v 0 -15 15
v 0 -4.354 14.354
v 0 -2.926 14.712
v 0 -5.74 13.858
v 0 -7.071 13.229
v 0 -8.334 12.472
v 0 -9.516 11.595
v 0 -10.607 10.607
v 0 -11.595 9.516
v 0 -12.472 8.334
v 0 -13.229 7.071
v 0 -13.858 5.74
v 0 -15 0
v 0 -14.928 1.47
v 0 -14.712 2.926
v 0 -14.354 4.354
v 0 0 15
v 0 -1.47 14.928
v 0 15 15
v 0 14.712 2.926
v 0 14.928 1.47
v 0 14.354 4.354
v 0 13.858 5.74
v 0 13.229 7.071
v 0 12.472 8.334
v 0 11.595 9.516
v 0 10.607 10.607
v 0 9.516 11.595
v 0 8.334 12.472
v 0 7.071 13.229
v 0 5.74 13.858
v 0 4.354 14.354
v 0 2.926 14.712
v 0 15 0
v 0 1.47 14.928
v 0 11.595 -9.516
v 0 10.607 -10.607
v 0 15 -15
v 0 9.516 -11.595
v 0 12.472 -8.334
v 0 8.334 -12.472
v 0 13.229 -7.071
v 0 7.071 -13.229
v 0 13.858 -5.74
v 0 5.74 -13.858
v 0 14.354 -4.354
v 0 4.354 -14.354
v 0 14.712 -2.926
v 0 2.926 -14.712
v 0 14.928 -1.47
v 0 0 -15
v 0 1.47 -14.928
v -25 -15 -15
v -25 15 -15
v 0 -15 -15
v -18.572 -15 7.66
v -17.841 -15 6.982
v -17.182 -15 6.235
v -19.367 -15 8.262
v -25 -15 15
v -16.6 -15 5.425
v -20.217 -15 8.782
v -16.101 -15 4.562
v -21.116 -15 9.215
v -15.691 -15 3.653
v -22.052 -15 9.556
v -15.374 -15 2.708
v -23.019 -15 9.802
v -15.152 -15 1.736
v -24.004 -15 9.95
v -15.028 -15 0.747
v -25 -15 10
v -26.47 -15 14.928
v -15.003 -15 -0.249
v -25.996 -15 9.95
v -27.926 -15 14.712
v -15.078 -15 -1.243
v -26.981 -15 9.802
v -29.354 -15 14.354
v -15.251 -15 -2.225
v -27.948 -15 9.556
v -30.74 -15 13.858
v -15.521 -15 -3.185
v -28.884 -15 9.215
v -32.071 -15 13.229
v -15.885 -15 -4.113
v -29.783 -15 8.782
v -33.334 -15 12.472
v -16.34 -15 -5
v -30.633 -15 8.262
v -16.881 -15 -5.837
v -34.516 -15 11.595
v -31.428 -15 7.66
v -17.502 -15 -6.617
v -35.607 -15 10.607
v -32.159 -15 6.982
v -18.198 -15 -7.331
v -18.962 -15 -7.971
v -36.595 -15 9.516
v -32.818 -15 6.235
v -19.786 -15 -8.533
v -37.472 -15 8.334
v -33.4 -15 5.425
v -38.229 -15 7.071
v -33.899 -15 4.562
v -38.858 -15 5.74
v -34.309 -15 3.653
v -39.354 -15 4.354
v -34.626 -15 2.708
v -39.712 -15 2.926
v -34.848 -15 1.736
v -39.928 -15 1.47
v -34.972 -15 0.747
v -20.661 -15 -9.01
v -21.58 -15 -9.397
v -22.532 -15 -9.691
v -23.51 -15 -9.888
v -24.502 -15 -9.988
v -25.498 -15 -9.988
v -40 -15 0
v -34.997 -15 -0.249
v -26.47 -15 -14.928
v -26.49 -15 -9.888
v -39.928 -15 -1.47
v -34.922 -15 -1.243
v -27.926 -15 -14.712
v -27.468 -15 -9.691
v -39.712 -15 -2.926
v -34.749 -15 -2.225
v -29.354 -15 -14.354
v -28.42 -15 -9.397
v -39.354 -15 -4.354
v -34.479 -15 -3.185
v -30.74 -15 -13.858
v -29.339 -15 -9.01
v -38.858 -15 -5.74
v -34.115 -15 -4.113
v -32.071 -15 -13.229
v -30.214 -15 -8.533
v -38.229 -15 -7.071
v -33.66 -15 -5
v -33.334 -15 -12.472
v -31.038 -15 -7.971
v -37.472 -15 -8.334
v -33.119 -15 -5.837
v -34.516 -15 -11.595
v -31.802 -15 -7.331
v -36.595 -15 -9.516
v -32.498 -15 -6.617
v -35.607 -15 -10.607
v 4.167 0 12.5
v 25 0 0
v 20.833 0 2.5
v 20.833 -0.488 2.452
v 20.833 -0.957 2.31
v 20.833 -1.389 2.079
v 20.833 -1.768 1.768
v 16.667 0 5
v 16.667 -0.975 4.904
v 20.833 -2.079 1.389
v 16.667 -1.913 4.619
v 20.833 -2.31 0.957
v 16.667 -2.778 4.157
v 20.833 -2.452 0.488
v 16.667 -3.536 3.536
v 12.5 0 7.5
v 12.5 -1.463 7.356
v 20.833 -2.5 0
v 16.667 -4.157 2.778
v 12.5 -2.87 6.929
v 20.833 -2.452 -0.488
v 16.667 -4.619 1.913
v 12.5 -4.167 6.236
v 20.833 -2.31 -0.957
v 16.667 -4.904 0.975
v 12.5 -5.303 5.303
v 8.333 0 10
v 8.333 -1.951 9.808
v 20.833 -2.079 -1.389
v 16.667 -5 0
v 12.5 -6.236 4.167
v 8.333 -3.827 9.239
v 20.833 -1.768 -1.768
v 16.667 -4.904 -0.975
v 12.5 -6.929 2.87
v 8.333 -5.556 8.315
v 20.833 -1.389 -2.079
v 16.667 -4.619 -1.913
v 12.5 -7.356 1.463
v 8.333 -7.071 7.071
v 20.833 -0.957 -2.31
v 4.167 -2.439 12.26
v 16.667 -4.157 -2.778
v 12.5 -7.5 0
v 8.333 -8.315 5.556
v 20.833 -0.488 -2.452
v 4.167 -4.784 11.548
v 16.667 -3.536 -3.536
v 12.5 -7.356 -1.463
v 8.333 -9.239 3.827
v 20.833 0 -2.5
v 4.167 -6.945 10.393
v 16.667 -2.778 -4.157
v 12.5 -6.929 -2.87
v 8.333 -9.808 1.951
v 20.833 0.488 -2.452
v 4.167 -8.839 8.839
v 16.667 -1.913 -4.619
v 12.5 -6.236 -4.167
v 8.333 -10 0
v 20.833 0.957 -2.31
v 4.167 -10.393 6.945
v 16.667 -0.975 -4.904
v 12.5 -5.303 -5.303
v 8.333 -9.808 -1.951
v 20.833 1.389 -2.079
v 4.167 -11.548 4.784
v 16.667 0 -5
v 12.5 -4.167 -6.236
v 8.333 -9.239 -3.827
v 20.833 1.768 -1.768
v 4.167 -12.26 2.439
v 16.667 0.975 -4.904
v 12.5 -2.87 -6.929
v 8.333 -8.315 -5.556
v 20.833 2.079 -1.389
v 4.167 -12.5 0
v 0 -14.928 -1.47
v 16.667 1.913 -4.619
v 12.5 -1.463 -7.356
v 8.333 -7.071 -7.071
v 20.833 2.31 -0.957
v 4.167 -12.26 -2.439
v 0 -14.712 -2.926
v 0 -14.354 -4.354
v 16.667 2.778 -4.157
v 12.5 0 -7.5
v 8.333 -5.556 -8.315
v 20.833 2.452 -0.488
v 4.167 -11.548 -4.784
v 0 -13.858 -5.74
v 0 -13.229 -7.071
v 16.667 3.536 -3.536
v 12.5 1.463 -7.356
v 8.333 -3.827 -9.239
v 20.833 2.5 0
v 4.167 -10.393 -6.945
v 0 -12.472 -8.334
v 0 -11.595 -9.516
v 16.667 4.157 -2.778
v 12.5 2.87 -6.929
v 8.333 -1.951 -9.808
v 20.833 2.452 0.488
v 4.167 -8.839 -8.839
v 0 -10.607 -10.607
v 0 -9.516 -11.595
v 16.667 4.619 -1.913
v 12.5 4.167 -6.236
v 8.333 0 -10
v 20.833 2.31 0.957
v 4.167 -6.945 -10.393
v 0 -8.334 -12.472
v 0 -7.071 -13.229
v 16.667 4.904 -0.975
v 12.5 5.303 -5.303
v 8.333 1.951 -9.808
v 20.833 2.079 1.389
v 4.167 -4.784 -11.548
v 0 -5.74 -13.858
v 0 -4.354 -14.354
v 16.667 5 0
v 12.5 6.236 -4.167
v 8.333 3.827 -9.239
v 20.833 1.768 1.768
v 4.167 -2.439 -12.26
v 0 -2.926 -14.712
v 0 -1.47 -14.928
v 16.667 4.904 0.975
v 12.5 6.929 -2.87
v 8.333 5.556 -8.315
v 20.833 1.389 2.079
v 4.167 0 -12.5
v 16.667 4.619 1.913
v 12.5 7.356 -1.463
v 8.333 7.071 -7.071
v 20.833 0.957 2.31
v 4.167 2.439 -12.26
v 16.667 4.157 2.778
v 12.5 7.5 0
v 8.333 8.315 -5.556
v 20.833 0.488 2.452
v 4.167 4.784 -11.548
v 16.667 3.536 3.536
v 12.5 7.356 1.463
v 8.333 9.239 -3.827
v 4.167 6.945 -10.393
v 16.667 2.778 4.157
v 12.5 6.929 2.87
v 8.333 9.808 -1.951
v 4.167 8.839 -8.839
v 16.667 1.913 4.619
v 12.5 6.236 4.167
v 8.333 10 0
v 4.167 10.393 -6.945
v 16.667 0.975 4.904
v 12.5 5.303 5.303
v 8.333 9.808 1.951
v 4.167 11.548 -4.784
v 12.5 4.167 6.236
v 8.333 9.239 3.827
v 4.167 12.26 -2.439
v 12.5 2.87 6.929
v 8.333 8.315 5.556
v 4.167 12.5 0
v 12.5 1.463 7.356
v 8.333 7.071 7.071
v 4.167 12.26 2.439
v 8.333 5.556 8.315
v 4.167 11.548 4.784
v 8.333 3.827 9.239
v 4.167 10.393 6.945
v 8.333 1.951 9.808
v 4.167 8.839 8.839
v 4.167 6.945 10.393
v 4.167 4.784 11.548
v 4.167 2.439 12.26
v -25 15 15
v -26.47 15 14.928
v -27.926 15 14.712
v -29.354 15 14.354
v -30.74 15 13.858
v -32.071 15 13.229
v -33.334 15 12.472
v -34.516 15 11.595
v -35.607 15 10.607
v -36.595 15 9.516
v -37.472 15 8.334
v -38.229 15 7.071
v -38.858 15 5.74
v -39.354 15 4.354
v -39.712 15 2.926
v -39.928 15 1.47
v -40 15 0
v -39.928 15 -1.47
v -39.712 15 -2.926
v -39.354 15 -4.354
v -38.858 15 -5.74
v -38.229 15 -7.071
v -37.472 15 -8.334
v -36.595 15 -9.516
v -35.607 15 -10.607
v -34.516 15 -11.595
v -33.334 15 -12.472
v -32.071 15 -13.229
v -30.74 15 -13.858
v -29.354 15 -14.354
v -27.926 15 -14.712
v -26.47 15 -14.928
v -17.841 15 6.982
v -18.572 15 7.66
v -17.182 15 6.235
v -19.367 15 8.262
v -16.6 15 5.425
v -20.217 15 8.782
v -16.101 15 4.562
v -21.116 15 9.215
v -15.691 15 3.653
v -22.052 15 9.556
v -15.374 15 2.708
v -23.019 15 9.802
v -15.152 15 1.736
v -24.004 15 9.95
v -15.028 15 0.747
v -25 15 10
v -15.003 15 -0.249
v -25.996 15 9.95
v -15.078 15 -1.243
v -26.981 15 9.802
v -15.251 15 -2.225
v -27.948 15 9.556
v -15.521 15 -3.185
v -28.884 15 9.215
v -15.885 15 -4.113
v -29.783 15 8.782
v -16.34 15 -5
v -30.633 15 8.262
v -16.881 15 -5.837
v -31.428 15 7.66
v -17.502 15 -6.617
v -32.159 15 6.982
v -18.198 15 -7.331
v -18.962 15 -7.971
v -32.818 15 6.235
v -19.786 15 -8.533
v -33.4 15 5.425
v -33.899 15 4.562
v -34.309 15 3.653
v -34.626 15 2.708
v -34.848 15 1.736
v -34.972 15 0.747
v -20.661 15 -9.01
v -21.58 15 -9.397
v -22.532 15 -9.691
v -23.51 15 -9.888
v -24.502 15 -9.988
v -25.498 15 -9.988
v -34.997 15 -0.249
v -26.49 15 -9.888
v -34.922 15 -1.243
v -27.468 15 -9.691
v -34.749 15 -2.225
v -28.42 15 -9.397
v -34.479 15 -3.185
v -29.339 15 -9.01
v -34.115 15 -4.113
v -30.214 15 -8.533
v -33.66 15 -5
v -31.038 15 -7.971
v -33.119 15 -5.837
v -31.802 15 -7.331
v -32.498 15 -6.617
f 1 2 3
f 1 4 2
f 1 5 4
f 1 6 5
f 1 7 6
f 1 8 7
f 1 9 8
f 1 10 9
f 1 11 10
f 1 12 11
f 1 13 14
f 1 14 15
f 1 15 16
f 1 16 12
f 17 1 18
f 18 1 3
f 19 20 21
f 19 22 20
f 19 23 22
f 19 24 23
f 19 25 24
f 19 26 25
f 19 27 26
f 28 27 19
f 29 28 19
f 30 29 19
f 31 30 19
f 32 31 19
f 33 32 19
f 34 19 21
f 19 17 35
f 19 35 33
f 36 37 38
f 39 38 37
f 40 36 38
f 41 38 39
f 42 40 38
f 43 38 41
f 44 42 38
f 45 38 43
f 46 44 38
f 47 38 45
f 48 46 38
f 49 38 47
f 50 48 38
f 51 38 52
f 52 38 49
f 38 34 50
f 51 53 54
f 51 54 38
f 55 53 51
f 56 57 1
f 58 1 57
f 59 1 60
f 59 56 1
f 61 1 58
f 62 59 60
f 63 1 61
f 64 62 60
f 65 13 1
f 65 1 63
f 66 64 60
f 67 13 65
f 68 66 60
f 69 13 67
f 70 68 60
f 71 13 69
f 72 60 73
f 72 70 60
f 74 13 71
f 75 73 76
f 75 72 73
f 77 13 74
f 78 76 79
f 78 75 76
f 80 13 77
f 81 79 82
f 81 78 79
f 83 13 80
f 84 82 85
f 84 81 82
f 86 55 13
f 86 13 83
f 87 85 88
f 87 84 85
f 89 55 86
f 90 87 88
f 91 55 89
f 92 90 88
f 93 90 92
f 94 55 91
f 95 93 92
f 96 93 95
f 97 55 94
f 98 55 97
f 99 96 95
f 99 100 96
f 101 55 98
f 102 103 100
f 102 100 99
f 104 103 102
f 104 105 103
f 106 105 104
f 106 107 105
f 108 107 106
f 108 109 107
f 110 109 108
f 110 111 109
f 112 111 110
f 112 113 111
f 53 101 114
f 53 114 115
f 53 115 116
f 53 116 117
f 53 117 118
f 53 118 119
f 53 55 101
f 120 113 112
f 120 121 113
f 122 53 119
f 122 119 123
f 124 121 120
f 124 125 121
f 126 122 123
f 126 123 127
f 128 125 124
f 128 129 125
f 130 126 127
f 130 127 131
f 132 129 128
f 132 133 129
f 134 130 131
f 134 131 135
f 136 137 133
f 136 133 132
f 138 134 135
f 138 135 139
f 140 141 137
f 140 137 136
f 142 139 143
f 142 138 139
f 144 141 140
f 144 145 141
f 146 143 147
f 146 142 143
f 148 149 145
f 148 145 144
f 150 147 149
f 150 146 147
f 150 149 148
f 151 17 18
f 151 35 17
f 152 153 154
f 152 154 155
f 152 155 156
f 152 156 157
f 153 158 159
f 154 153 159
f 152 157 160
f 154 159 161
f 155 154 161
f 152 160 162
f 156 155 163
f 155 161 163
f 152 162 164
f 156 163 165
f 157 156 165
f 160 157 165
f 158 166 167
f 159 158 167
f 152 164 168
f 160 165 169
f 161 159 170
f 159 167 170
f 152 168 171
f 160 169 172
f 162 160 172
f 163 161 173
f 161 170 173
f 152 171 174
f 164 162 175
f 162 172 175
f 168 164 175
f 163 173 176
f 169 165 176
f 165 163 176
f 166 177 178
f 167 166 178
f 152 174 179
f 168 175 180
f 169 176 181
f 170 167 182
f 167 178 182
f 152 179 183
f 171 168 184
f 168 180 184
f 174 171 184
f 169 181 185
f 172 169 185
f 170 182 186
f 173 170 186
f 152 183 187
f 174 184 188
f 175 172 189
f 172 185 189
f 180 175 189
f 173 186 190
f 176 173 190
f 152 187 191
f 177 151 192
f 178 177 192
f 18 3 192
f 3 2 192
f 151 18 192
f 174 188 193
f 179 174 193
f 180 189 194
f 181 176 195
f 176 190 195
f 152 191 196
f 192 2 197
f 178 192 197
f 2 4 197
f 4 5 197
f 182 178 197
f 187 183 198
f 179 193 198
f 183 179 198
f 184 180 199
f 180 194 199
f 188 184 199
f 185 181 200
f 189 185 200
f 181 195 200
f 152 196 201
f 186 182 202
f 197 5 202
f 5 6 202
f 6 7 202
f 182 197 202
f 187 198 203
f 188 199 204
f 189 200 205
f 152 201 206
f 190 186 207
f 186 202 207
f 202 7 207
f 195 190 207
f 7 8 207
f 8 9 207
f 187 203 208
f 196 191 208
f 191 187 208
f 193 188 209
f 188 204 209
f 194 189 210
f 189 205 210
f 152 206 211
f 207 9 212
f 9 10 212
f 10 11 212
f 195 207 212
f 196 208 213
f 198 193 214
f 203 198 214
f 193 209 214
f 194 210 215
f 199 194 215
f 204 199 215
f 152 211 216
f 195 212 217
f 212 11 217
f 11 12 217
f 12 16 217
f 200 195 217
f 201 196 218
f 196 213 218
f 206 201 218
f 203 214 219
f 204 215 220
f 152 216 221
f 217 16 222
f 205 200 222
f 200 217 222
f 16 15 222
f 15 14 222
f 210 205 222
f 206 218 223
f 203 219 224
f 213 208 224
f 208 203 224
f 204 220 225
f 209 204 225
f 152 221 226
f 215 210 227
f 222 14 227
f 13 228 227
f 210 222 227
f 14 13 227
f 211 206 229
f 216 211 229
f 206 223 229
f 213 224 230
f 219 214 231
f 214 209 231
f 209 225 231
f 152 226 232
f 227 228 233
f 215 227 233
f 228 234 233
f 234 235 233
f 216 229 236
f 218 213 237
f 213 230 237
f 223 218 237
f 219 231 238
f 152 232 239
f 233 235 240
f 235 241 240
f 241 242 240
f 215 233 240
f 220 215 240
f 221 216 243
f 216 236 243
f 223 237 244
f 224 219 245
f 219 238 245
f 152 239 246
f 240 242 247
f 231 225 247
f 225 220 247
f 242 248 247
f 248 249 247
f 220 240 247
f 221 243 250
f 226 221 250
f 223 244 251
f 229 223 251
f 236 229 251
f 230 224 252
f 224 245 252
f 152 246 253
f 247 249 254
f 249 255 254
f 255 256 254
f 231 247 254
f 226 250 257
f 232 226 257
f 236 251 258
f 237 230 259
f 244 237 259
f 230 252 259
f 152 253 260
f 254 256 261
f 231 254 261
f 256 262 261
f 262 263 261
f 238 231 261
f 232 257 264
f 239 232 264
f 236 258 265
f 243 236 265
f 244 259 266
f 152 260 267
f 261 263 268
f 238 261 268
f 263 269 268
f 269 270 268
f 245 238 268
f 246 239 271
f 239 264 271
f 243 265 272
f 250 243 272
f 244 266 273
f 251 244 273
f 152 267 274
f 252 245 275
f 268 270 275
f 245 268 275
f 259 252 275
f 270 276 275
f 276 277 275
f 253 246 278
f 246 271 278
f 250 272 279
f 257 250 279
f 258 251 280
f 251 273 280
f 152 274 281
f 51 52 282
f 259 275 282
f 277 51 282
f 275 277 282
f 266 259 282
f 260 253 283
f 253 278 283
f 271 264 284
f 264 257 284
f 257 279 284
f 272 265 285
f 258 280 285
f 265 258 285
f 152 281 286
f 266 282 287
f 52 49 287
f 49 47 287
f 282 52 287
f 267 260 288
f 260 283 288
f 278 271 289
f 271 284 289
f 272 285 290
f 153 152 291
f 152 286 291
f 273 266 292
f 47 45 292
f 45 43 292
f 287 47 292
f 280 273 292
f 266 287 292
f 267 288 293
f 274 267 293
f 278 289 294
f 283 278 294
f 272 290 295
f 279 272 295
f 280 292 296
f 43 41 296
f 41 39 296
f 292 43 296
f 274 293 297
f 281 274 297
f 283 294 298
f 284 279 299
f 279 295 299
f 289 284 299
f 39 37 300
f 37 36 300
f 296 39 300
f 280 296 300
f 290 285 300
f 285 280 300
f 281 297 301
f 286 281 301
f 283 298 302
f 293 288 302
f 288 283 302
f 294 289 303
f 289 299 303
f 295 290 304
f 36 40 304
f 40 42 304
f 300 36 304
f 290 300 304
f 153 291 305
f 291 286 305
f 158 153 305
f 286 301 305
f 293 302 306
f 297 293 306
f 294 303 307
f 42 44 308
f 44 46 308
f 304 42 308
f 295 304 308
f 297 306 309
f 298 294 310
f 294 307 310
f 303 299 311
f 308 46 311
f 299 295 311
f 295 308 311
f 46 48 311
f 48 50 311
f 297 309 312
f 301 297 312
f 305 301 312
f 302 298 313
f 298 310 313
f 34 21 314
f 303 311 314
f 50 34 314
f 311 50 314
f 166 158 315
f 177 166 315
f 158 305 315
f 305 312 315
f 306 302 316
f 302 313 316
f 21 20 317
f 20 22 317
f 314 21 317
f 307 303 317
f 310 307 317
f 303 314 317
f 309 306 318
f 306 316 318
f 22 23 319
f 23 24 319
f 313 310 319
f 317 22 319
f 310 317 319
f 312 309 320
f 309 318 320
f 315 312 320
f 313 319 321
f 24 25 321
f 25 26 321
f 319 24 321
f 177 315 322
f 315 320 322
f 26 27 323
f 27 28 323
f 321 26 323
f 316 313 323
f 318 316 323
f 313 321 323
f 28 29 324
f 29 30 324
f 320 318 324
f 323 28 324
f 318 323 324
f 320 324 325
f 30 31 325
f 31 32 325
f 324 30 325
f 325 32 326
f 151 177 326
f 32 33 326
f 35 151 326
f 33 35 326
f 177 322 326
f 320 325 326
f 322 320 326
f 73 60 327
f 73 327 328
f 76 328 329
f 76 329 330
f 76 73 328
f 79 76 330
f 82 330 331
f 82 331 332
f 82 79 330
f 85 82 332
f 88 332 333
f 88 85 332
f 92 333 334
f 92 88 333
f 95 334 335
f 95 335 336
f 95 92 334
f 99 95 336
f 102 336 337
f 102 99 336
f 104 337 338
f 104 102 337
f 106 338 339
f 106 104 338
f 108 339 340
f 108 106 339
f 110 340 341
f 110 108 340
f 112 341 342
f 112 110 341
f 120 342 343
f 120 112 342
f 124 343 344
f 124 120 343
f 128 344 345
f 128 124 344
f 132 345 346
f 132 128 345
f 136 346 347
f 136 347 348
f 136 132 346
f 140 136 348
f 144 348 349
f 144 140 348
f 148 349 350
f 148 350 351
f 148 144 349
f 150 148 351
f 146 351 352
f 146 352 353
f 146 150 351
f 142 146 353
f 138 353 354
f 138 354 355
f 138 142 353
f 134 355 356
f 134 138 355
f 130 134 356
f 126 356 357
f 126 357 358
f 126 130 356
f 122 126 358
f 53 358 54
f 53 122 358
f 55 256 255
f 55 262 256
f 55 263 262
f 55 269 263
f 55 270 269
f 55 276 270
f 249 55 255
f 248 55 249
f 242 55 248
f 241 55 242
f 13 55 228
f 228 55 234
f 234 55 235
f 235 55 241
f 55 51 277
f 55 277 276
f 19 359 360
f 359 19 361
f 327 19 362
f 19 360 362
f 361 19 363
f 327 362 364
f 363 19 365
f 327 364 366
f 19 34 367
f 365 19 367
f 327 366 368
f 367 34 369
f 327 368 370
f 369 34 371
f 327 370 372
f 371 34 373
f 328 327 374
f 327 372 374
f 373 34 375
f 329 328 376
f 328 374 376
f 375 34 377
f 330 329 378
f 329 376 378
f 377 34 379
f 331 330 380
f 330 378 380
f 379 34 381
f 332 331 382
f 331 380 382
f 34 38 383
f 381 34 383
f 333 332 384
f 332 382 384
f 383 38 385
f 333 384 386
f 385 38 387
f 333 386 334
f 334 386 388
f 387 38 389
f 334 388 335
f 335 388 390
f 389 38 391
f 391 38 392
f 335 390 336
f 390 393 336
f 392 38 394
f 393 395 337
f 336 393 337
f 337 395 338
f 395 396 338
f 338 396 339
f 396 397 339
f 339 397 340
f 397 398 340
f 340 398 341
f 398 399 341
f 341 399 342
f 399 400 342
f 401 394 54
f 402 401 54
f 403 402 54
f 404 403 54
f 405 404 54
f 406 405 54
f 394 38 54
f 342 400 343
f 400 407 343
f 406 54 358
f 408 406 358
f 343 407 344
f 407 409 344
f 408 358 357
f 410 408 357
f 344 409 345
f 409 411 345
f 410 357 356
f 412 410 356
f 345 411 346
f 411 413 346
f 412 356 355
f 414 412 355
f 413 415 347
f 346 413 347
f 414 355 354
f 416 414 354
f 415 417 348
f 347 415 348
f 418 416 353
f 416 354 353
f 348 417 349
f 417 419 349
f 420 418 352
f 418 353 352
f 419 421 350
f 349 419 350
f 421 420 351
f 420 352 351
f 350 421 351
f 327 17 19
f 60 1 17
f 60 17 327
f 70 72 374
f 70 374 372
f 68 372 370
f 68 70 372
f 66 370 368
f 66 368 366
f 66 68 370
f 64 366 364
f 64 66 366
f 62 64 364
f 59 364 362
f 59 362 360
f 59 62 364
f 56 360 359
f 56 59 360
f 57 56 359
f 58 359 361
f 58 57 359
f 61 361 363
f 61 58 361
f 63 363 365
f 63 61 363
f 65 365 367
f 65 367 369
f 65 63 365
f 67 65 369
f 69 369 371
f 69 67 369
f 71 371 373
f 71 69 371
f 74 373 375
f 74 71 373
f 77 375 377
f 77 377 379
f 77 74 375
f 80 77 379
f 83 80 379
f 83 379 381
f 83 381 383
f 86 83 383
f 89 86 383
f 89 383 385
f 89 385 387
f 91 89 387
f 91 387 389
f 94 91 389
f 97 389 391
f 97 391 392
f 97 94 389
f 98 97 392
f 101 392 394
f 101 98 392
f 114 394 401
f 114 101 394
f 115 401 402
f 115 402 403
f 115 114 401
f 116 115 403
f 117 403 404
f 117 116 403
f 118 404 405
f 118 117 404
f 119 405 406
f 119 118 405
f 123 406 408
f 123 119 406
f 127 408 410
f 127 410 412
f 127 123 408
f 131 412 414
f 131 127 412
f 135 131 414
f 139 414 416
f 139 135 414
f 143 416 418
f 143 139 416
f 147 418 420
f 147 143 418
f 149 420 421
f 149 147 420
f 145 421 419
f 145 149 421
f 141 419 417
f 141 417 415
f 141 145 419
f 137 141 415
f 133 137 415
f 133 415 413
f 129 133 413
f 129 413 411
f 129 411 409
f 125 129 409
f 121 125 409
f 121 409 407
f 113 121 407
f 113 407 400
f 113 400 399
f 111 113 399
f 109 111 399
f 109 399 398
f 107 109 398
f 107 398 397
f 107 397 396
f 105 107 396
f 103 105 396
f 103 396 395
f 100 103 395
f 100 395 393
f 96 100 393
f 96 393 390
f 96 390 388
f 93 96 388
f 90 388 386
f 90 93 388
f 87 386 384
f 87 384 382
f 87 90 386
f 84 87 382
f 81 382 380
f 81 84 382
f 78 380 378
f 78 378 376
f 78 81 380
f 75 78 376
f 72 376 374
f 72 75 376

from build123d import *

# Parameters (mm, degrees)
BOSS_EXTRUDE2_DEPTH      = 15
BOSS_EXTRUDE2_DEPTH_BACK = 15
SKETCH1_R                = 10


with BuildPart() as part:
    # Sketch1 → Boss-Extrude2 (new, two sides: drawn at the far end of the back side and taken through both)
    with BuildSketch(Plane(origin=(0, 0, 0), x_dir=(1, 0, 0), z_dir=(0, 1, 0)).offset(-BOSS_EXTRUDE2_DEPTH_BACK)):
        with BuildLine():
            Line((0, 15), (-25, 15))
            ThreePointArc((-25, 15), (-40, 0), (-25, -15))
            Line((-25, -15), (0, -15))
            Line((0, -15), (0, 0))
            Line((0, 0), (0, 15))
        make_face()
        with Locations((-25, 0)):
            Circle(SKETCH1_R, mode=Mode.SUBTRACT)
    extrude(amount=BOSS_EXTRUDE2_DEPTH + BOSS_EXTRUDE2_DEPTH_BACK)

    # Sketch1<4> → Revolve2 (revolve)
    with BuildSketch(Plane(origin=(0, 0, 0), x_dir=(1, 0, 0), z_dir=(0, 1, 0))):
        Polygon((25, 0), (0, 15), (0, 0), align=None)
    revolve(axis=Axis((0, 0, 0), (1, 0, 0)))


solid = part.part
